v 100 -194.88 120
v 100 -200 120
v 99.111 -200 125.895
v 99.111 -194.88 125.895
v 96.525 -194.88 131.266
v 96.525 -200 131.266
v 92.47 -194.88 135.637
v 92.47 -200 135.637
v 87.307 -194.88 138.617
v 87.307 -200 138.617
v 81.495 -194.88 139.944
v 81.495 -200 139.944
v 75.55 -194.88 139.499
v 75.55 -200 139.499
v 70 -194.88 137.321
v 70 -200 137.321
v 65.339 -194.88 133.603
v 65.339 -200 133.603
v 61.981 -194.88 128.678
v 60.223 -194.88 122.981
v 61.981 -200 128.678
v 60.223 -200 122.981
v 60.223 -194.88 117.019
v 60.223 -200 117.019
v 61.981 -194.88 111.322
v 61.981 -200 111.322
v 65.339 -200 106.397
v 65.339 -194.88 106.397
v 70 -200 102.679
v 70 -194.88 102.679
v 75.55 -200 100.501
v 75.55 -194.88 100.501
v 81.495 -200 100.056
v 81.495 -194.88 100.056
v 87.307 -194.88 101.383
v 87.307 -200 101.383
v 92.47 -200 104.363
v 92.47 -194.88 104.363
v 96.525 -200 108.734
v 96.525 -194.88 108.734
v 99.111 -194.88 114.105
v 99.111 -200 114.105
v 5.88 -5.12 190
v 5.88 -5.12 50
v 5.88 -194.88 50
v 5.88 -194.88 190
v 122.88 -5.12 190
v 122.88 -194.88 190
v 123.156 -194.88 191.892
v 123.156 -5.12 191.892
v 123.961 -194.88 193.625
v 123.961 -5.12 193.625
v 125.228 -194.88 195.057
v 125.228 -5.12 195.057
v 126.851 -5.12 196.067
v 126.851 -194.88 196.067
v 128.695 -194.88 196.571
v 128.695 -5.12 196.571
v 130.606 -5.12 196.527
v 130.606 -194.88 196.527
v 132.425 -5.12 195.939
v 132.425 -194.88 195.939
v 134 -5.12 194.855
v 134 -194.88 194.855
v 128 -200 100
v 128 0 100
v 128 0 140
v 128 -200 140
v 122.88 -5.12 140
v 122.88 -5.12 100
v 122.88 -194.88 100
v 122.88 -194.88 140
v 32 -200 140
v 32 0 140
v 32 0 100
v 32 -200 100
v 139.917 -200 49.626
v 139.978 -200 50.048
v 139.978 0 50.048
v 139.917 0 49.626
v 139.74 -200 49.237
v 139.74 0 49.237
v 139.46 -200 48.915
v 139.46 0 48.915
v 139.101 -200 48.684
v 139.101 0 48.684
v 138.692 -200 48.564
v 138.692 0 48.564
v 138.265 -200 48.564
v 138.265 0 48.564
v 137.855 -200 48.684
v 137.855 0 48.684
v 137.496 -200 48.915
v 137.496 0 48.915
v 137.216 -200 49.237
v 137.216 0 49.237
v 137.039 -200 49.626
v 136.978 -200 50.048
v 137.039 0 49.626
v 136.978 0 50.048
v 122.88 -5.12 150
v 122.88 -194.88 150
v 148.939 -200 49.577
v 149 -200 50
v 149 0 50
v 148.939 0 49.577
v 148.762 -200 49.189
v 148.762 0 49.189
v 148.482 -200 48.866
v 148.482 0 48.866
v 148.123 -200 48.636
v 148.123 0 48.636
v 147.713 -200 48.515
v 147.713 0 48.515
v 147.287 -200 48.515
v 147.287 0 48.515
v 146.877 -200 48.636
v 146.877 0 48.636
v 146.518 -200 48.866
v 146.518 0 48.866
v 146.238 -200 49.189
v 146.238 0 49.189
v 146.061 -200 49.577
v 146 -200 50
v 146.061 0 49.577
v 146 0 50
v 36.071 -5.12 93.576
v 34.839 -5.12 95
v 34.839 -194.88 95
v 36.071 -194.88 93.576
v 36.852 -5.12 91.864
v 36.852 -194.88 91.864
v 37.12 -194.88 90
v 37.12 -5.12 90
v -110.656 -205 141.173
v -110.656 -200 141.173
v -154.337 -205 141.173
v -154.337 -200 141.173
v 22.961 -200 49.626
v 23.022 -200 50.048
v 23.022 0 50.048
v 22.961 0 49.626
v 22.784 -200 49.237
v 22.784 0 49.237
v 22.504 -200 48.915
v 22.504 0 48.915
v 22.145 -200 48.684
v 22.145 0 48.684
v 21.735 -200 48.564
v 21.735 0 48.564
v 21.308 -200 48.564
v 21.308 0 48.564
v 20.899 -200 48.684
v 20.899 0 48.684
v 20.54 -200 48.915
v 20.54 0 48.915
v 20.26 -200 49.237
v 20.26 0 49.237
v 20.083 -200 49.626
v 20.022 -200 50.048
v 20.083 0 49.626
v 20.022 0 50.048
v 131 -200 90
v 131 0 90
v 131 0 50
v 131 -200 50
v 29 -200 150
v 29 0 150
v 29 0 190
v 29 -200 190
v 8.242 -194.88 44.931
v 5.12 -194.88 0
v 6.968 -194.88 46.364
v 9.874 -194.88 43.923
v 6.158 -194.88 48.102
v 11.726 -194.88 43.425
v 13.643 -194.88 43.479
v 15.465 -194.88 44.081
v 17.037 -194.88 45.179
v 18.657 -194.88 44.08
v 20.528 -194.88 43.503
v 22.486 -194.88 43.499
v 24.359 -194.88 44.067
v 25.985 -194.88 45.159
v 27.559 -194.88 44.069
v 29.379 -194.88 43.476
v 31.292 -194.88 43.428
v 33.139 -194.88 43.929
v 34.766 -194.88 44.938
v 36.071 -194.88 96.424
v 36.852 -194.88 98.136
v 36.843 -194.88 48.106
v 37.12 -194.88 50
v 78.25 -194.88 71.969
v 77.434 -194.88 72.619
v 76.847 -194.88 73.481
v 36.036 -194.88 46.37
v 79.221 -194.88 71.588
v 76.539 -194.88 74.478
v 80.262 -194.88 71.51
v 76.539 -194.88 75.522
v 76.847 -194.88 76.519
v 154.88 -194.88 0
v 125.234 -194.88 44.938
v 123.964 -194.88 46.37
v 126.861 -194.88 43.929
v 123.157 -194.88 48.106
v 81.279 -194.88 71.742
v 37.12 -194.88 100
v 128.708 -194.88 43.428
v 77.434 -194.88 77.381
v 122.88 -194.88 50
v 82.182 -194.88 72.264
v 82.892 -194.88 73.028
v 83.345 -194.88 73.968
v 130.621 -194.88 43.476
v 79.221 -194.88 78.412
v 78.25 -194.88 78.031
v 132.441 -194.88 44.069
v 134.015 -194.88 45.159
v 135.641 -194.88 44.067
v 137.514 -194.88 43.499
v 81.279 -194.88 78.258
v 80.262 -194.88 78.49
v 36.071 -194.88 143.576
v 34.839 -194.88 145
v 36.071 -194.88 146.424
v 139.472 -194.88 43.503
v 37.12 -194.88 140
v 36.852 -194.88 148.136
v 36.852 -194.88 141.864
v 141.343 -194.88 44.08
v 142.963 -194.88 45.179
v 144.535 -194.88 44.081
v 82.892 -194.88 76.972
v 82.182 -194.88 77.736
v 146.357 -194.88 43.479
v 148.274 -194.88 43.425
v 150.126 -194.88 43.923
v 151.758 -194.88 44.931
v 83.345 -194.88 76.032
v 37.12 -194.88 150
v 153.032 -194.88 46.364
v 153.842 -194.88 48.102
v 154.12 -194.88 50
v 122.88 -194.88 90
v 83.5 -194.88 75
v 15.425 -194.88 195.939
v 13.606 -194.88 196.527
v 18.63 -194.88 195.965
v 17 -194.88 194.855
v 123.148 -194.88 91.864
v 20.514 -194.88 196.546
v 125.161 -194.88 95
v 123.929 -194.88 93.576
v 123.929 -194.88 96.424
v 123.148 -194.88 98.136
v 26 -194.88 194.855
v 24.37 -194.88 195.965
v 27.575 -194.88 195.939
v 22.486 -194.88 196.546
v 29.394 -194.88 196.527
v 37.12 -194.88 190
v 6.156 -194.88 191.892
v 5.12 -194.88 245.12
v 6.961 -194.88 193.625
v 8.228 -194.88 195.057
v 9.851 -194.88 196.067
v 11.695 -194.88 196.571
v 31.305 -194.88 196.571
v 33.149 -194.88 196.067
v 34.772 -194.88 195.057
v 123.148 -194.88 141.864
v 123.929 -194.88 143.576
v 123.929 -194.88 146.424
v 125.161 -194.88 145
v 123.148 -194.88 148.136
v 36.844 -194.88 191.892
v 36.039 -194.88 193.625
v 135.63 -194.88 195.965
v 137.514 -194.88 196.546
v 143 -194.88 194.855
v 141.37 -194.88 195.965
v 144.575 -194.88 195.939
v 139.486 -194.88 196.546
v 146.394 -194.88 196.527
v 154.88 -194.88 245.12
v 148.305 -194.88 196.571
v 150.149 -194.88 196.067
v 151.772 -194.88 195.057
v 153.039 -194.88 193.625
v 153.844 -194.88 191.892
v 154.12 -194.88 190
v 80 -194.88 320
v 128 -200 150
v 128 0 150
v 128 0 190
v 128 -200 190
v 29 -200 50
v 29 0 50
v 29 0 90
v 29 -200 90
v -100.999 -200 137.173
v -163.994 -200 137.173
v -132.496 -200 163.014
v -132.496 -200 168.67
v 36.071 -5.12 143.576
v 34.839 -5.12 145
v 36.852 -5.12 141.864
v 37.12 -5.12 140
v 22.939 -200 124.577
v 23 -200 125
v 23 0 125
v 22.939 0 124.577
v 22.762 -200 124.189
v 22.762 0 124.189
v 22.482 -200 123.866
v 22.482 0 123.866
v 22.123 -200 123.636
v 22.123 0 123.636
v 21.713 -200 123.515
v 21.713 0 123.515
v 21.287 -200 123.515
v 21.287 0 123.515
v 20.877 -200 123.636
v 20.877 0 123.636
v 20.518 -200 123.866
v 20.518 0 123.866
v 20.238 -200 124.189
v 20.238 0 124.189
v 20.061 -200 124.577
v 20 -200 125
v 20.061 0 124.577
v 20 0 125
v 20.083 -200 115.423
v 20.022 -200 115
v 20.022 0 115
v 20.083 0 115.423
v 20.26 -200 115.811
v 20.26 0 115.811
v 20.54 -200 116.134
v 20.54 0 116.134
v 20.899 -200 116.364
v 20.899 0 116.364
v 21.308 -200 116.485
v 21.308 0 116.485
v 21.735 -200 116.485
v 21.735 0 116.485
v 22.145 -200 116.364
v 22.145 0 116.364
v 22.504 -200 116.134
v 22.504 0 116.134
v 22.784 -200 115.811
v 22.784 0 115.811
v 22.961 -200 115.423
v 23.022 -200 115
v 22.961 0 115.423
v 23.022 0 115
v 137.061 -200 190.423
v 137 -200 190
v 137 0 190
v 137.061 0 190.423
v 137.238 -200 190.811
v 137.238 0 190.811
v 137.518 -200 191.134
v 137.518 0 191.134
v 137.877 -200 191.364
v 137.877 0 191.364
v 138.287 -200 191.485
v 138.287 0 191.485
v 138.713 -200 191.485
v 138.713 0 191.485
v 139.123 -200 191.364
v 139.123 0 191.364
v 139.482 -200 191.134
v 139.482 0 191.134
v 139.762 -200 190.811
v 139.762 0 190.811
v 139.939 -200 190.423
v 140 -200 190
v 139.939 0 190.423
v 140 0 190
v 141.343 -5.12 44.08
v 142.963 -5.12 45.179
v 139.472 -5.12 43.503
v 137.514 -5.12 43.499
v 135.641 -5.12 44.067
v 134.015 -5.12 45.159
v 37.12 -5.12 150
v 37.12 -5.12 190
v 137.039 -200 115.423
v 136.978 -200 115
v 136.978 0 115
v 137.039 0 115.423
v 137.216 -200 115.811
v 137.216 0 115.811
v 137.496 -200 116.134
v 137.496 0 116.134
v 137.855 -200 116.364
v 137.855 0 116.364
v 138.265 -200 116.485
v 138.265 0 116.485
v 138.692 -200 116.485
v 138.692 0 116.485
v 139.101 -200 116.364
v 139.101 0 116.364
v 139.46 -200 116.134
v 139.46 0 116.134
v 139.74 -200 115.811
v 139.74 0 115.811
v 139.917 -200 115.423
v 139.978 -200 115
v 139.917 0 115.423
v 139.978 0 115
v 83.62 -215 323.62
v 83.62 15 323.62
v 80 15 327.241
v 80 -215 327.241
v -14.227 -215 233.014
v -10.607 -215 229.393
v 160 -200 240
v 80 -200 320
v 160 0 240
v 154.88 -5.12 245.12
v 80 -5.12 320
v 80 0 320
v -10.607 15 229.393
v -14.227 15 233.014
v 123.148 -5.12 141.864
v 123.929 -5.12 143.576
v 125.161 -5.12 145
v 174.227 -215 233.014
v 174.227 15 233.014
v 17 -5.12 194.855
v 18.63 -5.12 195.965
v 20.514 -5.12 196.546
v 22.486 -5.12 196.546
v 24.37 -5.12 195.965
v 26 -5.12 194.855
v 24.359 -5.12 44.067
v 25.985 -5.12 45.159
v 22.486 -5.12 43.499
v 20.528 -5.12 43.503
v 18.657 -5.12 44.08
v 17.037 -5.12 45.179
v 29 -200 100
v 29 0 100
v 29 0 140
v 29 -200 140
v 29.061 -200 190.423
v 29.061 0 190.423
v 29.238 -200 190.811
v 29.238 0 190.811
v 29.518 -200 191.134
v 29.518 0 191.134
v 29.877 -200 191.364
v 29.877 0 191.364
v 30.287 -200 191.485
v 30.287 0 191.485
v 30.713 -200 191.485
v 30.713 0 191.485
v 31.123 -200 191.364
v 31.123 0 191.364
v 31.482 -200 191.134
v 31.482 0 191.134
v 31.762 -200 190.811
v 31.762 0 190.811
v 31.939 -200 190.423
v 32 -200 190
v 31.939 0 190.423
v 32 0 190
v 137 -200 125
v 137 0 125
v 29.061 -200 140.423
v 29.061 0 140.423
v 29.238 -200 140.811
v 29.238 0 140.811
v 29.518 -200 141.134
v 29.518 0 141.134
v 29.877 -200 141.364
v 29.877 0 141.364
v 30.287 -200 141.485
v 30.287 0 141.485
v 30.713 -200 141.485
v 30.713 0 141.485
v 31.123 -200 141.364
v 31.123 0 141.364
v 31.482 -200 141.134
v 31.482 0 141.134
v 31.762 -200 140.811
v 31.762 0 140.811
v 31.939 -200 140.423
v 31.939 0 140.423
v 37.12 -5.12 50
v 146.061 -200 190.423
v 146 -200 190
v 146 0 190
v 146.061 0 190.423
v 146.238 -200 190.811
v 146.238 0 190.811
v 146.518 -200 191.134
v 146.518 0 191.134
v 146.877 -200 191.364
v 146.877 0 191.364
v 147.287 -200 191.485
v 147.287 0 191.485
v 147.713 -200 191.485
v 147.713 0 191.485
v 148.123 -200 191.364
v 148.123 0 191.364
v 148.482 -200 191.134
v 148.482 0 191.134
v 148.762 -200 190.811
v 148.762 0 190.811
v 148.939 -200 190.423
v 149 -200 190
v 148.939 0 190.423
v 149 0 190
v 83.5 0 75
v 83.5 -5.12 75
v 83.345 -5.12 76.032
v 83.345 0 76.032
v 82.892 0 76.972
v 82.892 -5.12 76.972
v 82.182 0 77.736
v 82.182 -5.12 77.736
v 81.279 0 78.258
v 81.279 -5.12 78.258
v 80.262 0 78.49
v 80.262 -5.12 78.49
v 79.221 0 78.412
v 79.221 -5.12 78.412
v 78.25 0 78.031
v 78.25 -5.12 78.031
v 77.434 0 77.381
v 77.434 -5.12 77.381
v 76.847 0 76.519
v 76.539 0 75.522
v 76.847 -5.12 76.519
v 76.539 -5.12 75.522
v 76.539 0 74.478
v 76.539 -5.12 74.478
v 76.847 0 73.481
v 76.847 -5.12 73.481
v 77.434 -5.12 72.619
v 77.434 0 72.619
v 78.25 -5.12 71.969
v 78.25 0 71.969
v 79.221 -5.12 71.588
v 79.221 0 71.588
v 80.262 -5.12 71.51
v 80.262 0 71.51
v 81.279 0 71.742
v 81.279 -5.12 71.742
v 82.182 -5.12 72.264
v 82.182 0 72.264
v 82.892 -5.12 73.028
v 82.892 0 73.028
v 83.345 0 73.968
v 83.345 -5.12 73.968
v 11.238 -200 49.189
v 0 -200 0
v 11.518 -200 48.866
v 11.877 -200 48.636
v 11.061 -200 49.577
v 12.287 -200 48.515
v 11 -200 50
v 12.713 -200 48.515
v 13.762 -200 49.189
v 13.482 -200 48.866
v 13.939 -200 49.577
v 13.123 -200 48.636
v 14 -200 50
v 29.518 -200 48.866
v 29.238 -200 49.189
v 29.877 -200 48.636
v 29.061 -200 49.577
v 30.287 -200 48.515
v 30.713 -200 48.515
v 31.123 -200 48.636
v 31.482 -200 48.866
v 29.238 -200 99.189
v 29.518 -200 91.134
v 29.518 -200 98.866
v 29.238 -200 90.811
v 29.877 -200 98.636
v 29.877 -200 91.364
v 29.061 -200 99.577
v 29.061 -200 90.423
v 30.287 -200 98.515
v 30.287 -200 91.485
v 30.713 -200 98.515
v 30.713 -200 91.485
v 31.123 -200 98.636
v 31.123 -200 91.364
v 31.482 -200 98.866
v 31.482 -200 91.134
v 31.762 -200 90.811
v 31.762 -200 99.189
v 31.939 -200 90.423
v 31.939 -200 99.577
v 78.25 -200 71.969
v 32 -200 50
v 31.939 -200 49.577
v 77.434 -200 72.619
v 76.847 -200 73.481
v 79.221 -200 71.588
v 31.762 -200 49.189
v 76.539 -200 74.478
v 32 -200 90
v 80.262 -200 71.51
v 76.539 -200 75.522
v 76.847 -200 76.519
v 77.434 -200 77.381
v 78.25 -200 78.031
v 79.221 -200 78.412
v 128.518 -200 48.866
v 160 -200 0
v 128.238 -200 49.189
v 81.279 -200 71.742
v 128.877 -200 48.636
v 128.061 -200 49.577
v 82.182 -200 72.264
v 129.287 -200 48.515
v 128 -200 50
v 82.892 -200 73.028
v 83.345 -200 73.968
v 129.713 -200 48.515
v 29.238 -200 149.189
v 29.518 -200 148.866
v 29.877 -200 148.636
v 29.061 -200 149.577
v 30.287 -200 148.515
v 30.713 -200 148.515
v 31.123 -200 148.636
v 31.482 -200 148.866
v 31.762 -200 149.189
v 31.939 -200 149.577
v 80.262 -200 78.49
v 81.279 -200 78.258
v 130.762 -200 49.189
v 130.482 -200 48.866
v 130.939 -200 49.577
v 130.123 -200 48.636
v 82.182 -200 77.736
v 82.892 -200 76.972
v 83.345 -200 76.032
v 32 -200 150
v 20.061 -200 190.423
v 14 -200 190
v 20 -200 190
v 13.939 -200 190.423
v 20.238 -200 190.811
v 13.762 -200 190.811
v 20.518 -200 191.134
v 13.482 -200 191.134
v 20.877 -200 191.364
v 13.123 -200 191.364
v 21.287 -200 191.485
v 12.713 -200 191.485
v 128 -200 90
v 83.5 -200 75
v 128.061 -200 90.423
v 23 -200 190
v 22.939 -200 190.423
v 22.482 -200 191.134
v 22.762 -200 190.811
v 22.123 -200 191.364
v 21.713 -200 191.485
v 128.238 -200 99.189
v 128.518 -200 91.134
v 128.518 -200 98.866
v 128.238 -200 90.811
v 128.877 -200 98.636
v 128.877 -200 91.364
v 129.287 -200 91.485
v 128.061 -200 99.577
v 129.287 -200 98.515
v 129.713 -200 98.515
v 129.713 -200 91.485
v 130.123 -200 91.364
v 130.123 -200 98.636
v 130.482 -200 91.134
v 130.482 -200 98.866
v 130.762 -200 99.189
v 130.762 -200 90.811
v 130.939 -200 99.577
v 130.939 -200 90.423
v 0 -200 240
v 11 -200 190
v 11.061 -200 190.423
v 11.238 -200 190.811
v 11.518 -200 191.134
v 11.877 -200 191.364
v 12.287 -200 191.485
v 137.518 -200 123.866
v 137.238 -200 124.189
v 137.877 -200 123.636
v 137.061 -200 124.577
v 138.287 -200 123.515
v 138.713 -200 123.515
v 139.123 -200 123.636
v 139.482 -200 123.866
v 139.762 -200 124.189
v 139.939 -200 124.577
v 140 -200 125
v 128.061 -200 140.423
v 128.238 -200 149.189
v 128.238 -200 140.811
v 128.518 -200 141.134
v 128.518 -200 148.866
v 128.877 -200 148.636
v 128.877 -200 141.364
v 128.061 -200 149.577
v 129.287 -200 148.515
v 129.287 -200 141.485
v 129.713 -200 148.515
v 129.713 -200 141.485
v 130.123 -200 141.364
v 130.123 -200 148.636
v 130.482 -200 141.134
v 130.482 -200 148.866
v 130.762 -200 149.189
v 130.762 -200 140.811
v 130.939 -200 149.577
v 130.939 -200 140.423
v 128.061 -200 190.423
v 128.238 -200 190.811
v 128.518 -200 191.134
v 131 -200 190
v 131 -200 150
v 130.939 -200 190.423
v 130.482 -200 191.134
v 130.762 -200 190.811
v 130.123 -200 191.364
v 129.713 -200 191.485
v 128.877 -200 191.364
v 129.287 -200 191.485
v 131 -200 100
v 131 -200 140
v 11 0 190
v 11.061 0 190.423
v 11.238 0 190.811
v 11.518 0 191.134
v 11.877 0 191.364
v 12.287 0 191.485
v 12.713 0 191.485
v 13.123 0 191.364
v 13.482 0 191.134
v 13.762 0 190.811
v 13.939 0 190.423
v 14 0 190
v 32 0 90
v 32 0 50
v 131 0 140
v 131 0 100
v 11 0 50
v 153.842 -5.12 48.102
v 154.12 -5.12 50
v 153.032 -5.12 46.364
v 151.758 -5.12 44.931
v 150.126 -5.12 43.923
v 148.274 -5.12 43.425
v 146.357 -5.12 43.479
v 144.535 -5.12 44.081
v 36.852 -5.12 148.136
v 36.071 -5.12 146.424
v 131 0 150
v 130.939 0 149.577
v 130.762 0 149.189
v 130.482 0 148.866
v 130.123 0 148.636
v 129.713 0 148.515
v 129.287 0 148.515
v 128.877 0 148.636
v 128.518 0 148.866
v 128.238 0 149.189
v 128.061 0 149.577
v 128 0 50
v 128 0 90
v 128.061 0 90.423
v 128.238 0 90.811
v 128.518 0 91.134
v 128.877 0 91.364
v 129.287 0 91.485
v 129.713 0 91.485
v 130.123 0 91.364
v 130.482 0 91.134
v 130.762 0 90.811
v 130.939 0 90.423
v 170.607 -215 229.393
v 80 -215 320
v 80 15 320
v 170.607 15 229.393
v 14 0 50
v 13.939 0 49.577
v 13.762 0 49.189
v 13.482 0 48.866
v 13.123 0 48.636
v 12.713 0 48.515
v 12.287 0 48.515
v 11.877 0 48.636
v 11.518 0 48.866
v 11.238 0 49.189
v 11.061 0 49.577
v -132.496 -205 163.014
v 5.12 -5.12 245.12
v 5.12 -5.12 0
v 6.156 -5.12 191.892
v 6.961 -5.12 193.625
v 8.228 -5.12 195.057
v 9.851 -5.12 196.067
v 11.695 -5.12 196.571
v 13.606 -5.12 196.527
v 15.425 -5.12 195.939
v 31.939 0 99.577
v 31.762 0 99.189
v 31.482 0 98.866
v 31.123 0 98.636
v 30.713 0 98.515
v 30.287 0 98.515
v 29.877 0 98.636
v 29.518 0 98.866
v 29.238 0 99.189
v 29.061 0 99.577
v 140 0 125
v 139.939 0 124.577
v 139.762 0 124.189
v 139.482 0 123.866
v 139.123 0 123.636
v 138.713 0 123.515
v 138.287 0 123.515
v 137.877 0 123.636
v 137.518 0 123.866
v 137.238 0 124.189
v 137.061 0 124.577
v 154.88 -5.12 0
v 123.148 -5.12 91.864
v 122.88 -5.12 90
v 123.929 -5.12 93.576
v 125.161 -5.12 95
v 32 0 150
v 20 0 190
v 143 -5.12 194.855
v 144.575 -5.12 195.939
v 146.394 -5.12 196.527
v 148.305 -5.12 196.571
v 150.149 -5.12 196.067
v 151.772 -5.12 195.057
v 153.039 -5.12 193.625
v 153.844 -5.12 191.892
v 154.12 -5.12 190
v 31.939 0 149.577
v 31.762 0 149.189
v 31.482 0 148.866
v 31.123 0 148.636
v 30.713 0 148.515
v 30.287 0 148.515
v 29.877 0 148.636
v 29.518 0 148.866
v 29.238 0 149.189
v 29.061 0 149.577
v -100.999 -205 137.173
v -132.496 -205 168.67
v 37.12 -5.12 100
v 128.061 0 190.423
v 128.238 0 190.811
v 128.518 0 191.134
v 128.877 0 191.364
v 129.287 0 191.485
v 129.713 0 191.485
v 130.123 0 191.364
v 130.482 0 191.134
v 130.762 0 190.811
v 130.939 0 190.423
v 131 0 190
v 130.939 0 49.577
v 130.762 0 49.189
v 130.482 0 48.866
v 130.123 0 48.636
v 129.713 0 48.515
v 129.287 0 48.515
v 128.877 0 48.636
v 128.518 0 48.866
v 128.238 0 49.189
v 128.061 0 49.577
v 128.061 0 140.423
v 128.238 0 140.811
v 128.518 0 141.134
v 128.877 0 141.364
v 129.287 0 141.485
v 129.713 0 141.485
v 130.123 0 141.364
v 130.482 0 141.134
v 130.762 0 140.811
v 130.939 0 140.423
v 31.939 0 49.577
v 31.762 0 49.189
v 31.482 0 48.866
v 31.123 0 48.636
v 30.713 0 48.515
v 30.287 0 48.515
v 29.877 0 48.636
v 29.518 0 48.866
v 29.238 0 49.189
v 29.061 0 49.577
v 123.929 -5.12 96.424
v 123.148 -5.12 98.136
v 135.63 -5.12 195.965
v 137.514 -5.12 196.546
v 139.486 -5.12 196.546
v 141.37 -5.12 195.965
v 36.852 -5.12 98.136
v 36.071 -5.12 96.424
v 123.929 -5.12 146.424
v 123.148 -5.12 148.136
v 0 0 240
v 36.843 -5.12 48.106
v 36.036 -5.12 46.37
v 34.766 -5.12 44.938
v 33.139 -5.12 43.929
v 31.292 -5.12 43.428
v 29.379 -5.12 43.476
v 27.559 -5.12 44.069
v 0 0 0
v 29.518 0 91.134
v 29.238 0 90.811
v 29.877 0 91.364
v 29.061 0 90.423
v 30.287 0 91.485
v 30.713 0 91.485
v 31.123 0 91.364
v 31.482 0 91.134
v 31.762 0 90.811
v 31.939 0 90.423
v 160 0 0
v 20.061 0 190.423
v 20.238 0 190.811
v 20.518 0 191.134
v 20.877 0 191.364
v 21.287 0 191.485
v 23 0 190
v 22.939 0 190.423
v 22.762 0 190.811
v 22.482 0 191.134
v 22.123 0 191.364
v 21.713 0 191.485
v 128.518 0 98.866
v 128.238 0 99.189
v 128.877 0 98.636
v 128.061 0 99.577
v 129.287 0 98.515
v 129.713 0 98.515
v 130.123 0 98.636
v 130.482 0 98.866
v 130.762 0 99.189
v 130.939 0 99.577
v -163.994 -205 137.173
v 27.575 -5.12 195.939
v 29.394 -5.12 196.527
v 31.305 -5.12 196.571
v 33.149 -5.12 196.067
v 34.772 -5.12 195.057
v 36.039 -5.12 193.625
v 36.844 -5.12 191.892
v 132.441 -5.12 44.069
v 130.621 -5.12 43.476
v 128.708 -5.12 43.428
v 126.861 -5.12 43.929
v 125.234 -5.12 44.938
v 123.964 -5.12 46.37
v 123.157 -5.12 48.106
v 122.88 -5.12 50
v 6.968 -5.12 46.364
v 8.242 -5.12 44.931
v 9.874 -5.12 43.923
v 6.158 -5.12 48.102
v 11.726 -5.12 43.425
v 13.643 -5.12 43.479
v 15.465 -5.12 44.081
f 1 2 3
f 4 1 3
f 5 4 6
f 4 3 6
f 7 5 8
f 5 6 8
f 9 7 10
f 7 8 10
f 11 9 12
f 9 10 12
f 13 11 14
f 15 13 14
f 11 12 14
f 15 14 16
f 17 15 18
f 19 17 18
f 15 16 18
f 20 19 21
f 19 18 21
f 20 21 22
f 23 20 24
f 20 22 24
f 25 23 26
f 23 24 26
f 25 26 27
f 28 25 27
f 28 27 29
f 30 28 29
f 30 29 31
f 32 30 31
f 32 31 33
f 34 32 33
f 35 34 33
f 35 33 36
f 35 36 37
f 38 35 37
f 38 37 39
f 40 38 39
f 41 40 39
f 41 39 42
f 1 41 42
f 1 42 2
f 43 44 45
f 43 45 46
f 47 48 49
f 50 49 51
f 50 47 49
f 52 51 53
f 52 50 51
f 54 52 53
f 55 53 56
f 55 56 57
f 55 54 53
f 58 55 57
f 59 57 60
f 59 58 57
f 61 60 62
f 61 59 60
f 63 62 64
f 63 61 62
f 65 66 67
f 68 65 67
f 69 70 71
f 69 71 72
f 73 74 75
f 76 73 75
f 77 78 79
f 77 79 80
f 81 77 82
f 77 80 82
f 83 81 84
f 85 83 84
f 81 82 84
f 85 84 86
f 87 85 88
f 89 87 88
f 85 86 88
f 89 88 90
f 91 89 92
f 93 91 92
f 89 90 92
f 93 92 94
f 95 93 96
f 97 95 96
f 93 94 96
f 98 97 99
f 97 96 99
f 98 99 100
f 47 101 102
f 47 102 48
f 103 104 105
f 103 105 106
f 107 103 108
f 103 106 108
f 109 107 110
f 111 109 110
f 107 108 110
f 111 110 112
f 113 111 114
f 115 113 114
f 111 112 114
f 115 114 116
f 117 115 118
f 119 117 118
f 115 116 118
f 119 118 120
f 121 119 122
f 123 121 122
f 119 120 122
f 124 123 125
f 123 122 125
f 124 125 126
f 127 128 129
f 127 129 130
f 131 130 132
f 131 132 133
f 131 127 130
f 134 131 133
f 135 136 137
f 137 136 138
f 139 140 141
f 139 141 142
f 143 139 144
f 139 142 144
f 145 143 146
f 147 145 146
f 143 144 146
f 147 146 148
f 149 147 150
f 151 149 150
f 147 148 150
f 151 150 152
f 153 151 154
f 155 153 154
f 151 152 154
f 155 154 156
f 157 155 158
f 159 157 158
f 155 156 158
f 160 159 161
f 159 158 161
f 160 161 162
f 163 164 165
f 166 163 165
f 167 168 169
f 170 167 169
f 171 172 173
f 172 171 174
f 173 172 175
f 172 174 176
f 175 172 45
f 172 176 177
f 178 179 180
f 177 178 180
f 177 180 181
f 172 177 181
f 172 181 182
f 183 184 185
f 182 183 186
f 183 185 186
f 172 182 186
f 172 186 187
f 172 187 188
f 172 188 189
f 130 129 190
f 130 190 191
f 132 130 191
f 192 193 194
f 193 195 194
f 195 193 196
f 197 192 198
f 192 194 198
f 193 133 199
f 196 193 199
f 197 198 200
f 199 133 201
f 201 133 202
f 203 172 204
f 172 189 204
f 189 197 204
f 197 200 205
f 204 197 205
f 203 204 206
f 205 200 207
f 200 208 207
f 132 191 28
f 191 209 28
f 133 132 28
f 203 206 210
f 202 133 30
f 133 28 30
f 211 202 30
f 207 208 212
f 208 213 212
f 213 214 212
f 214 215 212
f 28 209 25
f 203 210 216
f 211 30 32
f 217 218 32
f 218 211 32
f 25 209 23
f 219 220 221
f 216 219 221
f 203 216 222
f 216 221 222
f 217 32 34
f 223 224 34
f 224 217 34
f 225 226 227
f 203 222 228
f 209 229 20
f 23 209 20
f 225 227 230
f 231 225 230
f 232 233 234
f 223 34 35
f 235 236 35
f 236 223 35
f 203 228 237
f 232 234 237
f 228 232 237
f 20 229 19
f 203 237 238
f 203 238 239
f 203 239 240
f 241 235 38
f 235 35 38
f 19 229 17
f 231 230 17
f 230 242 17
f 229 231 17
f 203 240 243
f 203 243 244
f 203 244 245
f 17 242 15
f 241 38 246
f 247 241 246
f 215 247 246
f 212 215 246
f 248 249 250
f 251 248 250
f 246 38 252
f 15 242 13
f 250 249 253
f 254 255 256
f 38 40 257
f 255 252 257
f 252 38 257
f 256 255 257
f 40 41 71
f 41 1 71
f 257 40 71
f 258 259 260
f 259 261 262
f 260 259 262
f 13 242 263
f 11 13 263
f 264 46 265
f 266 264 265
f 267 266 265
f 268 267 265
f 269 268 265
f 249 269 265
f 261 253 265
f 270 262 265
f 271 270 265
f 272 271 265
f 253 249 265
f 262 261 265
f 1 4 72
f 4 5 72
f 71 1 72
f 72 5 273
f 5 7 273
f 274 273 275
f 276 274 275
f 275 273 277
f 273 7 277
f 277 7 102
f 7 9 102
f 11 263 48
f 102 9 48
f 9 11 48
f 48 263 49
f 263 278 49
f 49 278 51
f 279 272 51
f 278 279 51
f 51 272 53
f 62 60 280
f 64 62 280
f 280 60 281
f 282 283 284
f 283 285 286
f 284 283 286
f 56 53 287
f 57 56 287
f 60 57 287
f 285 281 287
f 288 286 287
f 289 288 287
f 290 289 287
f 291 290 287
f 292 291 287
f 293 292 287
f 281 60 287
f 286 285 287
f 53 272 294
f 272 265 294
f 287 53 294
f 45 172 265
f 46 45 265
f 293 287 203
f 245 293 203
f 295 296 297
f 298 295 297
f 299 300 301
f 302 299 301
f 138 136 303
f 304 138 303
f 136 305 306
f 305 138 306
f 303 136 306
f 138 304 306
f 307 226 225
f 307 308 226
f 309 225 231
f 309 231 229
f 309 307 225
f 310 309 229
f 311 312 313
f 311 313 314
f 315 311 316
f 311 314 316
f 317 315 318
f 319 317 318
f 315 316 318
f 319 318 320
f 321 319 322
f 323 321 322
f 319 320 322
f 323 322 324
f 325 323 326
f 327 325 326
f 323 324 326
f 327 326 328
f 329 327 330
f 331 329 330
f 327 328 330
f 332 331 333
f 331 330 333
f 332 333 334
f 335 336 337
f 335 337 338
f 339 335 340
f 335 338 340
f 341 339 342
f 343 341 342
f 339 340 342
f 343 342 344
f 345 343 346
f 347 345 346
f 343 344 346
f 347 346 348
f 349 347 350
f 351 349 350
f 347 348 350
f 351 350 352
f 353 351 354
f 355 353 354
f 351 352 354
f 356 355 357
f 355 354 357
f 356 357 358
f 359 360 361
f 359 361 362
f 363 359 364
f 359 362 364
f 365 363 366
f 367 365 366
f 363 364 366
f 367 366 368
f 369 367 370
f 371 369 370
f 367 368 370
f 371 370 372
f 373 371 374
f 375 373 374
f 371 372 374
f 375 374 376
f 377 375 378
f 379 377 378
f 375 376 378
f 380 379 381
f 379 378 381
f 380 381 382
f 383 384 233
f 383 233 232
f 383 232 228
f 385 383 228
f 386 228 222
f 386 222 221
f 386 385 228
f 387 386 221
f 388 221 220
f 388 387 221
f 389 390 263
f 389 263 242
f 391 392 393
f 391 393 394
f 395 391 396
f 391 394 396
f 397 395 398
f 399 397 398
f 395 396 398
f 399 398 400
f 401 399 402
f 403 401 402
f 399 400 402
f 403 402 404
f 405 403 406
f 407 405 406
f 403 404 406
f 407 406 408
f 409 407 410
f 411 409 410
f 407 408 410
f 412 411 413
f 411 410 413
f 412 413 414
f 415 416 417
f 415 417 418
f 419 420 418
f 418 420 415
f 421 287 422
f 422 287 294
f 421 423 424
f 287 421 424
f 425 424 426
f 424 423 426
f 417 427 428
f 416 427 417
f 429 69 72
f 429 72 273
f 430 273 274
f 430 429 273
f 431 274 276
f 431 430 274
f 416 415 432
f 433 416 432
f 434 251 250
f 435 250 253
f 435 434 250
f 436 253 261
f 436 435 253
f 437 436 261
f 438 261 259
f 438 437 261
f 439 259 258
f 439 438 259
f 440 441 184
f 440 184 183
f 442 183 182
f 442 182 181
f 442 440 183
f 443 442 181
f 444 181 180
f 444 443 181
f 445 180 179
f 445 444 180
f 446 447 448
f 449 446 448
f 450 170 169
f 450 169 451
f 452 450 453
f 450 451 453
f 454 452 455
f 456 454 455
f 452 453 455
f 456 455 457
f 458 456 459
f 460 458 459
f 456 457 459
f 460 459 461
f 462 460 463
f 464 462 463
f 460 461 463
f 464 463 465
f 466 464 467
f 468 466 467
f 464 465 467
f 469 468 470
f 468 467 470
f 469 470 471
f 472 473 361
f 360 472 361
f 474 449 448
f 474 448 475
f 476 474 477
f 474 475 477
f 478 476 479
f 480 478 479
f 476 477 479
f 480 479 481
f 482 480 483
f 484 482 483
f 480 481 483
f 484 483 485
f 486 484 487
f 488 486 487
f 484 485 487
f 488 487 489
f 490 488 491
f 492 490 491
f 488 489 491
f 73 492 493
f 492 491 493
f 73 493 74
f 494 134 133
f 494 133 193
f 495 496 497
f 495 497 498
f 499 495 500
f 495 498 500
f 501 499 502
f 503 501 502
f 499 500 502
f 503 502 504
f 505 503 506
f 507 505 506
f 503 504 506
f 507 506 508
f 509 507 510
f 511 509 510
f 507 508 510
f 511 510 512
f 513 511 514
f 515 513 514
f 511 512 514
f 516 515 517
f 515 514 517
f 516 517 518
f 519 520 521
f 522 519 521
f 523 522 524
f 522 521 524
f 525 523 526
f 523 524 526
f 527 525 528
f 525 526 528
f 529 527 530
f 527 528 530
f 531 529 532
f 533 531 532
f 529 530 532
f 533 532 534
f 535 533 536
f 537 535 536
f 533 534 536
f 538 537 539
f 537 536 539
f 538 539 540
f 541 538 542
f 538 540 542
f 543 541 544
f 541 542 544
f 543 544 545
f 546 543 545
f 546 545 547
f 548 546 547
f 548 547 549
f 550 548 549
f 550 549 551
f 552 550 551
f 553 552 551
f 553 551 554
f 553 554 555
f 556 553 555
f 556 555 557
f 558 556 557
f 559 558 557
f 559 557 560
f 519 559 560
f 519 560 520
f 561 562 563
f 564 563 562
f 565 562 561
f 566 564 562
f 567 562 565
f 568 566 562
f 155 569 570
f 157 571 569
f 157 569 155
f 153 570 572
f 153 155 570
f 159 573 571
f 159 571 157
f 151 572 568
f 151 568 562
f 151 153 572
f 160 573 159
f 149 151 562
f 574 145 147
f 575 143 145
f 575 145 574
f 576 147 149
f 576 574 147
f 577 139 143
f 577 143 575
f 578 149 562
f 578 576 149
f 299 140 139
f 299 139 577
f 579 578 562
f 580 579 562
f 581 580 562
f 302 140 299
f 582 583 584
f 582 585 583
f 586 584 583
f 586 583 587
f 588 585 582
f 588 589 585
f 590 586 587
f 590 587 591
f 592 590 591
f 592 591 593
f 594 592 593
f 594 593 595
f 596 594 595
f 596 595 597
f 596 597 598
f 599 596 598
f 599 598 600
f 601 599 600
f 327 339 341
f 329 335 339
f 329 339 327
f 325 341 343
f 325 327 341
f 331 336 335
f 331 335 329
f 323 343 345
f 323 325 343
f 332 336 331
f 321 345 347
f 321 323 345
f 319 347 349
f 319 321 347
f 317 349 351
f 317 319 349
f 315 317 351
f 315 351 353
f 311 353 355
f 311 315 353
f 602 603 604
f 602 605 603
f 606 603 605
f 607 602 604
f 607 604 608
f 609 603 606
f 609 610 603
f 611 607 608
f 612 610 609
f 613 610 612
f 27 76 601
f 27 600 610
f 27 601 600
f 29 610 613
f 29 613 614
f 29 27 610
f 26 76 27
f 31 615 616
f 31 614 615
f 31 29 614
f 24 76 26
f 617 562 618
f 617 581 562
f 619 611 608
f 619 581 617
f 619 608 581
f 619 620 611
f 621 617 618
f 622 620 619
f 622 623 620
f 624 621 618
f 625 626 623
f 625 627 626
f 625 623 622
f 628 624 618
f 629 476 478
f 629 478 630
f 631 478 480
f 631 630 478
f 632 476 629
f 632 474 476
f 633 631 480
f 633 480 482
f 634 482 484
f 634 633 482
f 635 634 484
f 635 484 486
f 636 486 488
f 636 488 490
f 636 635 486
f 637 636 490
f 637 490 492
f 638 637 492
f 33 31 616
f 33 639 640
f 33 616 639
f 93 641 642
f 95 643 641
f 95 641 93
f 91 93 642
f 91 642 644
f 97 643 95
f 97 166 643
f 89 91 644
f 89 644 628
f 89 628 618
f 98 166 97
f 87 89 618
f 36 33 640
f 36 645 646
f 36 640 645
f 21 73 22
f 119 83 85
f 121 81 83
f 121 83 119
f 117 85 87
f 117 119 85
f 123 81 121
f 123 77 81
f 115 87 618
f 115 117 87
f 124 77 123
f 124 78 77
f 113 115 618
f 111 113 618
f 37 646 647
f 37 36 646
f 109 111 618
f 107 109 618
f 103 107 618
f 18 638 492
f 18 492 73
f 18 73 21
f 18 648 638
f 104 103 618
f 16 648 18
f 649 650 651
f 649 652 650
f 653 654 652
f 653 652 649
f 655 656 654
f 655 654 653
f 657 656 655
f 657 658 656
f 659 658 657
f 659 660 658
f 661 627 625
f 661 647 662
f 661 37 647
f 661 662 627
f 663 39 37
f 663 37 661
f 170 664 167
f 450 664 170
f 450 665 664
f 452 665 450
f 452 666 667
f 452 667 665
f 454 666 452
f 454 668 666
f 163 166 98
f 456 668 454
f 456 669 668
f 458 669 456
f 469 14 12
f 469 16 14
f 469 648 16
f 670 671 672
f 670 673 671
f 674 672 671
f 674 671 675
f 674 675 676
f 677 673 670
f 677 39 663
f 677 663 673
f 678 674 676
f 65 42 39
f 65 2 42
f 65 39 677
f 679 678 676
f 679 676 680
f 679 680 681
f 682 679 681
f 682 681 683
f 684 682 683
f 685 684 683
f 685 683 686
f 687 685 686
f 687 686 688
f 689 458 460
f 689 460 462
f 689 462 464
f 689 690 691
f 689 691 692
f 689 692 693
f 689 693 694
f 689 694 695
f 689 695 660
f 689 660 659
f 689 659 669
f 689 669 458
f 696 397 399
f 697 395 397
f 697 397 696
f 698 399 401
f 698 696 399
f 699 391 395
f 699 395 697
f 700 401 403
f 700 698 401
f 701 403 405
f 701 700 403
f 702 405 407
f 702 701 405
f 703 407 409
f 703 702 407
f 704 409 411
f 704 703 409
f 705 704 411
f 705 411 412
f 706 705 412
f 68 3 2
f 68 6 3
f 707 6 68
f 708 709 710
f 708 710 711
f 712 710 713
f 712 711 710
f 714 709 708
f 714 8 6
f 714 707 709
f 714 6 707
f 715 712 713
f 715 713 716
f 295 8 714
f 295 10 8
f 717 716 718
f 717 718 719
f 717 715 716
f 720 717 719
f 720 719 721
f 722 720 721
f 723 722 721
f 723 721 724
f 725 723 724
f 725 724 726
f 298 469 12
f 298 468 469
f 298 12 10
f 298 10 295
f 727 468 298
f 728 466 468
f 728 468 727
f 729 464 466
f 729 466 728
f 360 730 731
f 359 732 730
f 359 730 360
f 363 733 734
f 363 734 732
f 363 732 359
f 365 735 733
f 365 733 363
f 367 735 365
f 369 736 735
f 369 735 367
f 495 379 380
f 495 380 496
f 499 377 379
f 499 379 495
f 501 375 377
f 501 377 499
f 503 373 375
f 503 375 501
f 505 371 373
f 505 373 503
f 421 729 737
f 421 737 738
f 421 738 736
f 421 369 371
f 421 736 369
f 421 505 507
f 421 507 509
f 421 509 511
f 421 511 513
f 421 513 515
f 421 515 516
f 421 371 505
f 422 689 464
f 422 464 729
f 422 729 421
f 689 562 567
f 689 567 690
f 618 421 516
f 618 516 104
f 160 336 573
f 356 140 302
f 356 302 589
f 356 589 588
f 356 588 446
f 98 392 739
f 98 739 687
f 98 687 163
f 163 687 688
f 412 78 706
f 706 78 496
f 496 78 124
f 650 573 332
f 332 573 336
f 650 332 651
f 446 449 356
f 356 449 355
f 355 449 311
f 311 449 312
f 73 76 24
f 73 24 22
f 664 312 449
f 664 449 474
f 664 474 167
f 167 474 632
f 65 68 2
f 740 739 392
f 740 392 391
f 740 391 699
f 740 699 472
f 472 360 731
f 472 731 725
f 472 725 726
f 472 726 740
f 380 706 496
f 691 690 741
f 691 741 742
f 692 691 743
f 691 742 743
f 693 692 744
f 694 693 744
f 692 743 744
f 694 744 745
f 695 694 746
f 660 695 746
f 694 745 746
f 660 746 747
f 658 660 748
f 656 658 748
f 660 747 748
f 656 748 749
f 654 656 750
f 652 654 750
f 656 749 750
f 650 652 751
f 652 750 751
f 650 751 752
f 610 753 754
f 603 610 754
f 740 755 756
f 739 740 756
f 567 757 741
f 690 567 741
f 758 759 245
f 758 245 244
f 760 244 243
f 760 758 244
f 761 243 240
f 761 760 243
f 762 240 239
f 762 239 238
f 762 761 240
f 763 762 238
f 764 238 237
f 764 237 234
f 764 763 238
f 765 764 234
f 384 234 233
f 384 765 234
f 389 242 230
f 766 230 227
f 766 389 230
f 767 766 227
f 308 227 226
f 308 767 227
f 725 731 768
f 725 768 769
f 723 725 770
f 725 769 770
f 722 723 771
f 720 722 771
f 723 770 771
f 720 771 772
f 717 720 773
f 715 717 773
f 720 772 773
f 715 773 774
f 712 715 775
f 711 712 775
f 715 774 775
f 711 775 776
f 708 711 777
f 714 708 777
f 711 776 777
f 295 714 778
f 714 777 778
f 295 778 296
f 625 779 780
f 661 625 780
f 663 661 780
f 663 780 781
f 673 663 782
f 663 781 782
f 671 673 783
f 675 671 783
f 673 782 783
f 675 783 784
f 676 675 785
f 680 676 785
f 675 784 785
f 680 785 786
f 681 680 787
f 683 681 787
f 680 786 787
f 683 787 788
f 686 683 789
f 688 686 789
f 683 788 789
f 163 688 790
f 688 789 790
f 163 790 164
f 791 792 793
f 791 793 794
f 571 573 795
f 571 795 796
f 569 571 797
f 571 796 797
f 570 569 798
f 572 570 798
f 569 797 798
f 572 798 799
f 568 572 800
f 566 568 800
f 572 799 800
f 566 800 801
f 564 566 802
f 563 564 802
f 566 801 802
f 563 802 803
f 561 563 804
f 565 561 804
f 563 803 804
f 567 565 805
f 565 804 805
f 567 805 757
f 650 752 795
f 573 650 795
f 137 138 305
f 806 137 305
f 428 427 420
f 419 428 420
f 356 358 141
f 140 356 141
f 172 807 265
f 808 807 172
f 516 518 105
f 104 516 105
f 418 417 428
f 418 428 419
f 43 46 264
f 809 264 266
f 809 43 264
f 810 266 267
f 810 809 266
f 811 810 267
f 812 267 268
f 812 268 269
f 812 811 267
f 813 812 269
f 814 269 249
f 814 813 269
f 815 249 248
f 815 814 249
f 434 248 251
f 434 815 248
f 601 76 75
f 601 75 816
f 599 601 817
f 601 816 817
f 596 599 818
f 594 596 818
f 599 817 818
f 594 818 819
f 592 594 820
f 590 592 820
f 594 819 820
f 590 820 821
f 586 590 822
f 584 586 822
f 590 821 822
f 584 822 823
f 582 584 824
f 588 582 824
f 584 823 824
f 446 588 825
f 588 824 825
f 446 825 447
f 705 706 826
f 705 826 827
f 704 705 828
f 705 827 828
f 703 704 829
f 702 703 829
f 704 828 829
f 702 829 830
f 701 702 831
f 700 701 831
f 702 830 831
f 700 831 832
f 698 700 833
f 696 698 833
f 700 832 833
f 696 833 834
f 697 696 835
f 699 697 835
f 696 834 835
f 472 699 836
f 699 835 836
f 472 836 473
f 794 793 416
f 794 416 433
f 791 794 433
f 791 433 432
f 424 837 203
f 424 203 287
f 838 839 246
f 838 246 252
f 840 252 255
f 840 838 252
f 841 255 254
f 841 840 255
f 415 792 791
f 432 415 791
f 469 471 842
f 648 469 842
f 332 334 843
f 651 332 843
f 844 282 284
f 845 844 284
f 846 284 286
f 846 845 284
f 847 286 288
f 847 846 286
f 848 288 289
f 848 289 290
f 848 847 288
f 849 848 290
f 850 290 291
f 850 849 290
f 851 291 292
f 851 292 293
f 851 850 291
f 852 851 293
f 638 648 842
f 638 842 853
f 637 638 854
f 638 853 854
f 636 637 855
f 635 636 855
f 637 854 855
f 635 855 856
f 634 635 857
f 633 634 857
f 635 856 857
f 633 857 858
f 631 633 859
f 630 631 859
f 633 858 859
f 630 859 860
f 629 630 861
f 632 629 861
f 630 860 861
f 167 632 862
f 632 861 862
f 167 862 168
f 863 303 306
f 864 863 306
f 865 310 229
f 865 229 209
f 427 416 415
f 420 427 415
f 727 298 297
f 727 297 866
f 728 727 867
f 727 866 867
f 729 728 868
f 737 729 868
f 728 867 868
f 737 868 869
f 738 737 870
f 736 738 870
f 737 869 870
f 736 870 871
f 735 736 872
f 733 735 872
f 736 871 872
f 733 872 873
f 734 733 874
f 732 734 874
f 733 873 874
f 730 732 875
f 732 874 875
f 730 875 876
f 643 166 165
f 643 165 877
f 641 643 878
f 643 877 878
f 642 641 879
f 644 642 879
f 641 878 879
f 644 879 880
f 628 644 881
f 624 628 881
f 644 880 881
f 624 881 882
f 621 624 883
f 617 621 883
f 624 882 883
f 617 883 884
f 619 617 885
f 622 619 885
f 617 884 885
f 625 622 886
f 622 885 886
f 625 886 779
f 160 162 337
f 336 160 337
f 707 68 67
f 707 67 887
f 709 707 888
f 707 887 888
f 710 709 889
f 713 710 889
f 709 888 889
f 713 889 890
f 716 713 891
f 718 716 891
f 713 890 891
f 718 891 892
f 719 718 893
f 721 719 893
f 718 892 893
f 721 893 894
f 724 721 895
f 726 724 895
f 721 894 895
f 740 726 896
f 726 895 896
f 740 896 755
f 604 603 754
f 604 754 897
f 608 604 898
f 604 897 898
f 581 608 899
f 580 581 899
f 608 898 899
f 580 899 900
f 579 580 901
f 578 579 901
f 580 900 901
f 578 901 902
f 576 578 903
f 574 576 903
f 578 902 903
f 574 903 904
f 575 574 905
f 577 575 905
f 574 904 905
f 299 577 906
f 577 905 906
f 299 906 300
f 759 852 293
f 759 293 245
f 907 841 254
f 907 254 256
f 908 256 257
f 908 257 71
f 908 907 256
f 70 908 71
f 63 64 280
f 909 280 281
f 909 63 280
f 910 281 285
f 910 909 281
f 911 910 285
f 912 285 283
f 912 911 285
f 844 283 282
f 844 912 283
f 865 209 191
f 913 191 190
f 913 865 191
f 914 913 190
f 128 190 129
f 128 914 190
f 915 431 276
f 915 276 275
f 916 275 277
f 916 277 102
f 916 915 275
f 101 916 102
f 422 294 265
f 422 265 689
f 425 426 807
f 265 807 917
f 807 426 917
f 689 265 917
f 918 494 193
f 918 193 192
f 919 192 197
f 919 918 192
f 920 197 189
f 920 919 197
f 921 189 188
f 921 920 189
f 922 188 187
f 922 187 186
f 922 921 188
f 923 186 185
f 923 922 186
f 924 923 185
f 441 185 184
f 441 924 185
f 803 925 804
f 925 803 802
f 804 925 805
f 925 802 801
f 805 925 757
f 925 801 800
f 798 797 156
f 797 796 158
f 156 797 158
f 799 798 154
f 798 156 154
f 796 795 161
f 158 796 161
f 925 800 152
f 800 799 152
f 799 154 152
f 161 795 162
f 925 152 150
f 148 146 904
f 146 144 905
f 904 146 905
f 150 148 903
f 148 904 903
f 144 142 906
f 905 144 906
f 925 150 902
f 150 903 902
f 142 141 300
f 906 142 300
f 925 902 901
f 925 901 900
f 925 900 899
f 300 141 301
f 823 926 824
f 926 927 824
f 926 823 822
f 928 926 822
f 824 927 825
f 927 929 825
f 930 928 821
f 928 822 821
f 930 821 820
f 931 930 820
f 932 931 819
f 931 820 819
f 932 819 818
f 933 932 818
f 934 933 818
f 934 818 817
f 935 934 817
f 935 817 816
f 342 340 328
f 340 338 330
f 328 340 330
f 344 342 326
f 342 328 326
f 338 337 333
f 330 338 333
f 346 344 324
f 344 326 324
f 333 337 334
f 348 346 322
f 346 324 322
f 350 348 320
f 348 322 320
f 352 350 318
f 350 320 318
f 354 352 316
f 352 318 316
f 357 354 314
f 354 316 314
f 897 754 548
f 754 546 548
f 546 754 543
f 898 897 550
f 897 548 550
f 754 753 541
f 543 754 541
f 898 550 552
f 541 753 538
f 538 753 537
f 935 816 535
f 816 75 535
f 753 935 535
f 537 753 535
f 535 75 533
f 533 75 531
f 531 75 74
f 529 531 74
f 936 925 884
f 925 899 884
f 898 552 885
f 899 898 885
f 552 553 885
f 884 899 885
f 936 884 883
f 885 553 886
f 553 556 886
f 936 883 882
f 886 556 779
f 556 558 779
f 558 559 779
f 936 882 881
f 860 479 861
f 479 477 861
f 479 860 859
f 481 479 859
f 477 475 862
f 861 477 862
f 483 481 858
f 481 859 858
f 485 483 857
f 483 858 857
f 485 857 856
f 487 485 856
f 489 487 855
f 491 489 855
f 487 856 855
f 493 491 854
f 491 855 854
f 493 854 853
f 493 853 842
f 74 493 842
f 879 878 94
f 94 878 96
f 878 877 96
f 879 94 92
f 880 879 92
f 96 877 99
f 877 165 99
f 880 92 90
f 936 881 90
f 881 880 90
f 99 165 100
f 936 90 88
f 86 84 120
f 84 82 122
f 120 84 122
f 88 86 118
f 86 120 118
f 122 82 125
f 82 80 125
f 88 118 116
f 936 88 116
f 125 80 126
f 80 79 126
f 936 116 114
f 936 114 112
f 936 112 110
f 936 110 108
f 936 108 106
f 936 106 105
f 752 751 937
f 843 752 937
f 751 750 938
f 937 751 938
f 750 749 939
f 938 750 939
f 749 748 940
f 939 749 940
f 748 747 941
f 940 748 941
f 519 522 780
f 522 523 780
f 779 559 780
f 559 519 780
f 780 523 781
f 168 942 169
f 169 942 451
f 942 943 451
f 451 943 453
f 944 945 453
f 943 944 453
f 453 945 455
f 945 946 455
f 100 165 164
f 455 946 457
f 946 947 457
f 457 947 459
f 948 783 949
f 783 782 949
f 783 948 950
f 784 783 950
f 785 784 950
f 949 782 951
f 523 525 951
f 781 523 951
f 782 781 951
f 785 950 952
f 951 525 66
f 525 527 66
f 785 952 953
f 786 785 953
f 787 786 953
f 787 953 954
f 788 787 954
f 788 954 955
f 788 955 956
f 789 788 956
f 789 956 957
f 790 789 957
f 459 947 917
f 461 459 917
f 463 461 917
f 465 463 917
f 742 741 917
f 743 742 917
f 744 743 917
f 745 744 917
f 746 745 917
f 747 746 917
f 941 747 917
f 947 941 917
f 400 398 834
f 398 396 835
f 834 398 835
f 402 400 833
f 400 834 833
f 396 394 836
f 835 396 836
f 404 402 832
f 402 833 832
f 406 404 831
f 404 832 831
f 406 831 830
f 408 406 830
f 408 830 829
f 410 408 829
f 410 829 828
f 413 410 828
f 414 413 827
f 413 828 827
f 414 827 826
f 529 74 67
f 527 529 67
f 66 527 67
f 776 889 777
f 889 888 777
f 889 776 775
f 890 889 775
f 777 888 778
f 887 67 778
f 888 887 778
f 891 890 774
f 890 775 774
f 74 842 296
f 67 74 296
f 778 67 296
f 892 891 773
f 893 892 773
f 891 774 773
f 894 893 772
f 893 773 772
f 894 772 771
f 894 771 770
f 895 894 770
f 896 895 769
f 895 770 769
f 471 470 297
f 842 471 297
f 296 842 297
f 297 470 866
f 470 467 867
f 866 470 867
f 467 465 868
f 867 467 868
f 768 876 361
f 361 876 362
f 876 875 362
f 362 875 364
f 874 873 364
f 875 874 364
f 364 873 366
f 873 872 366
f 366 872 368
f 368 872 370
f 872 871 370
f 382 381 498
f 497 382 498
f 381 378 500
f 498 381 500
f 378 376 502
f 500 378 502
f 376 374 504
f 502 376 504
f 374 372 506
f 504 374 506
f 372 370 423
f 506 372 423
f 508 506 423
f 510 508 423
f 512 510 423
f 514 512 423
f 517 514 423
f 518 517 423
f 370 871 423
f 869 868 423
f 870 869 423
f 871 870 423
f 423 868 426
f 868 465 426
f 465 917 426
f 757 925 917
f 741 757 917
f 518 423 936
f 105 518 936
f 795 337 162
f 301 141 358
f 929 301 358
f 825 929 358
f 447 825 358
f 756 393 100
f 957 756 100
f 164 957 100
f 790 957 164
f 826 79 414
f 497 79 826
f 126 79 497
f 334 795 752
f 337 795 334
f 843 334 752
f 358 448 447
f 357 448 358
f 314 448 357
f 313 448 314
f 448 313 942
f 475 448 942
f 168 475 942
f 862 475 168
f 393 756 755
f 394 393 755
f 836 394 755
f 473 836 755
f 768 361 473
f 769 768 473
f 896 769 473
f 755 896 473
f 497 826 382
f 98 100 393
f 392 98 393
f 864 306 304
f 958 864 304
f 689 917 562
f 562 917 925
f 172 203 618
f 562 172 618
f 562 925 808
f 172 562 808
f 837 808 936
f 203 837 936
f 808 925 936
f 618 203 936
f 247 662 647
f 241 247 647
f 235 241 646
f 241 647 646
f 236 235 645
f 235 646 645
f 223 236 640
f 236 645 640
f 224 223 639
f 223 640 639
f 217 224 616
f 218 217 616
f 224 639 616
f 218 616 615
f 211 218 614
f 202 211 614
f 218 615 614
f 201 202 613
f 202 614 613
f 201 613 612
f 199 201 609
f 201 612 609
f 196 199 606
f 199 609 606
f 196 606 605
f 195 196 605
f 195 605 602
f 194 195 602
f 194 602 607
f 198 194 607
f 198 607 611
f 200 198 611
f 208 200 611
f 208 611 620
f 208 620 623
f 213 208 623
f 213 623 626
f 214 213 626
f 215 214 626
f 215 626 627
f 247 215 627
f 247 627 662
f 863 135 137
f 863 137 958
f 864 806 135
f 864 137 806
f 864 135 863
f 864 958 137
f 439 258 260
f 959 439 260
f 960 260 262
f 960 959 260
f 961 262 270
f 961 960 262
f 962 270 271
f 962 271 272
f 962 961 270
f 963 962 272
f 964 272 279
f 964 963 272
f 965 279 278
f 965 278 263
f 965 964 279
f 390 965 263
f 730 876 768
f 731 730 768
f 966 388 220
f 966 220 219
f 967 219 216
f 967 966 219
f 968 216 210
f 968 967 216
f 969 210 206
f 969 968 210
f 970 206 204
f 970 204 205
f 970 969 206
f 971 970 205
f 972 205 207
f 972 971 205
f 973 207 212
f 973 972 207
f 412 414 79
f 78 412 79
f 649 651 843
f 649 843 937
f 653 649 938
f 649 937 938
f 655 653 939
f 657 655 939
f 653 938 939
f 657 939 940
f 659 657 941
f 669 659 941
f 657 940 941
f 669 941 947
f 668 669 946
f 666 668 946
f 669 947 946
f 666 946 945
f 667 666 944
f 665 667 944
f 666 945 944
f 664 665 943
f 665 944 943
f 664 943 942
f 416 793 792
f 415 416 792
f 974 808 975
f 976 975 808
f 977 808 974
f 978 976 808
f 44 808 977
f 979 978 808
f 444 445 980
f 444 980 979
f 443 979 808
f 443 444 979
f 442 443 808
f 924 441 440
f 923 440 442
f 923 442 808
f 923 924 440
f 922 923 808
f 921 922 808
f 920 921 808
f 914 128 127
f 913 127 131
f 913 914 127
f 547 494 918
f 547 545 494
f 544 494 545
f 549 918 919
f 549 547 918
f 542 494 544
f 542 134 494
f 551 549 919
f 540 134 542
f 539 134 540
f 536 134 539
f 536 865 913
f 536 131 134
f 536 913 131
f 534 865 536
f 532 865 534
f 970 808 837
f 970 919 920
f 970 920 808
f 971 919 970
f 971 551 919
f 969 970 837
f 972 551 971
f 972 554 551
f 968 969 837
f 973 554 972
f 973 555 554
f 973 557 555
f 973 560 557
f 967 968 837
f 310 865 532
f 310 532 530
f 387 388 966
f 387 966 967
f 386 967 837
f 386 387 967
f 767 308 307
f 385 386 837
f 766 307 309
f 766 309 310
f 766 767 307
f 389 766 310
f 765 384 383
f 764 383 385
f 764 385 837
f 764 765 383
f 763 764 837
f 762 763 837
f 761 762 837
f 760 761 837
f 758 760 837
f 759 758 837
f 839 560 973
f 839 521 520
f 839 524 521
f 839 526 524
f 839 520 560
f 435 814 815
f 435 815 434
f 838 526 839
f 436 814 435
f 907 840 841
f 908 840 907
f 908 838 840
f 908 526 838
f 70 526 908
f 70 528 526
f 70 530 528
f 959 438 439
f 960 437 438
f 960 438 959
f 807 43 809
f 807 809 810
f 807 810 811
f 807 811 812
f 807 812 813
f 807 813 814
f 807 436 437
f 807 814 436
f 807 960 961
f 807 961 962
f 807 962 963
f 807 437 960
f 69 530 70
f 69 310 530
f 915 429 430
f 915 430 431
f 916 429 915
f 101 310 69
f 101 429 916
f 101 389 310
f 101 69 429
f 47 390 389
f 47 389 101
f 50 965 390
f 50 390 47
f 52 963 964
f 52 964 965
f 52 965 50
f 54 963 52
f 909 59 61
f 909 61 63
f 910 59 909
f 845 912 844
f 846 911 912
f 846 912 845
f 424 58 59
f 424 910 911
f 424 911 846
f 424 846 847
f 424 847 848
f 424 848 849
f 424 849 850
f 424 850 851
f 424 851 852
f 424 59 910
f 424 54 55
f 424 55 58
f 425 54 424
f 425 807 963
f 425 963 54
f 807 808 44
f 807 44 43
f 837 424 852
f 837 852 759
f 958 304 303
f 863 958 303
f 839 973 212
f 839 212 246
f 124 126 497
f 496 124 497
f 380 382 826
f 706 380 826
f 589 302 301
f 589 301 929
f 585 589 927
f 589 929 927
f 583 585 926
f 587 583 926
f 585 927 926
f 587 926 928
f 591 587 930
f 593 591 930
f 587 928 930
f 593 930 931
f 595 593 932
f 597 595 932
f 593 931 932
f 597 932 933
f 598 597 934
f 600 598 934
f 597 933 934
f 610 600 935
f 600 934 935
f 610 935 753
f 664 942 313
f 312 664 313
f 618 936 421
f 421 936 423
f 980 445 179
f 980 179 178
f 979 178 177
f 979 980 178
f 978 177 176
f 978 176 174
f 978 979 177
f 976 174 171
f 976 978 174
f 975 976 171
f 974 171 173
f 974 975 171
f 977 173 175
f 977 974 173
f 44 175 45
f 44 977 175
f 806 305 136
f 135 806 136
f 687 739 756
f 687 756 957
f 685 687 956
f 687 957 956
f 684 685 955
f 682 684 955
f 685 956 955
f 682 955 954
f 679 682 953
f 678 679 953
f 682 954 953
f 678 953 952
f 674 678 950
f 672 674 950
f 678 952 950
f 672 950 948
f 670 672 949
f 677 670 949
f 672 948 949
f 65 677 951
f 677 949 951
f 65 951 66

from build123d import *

# Parameters (mm, degrees)
F1_DEPTH  = 200
F2_T      = -5.12
F3_R      = 20
F4_DEPTH  = 25
F3_R_2    = 3.5
F5_DEPTH  = 220
F7_W      = 128.137085
F7_H      = 230
F8_DEPTH  = 5.12
F10_W     = 230
F10_H     = 133.257085
F11_DEPTH = 5.12
F14_DEPTH = 5


with BuildPart() as f1:
    # F0 (on Front) → F1 (new body)
    with BuildSketch(Plane.XZ):
        Polygon((0, 240), (0, 0), (160, 0), (160, 240), (80, 320), align=None)
        with BuildLine():
            Line((29, 50), (29, 90))
            ThreePointArc((29, 90), (30.5, 91.5), (32, 90))
            Line((32, 90), (32, 50))
            ThreePointArc((32, 50), (30.5, 48.5), (29, 50))
        make_face(mode=Mode.SUBTRACT)
        with BuildLine():
            Line((20.021926, 50.048288), (20.021926, 115))
            ThreePointArc((20.021926, 115), (21.521926, 116.5), (23.021926, 115))
            Line((23.021926, 115), (23.021926, 50.048288))
            ThreePointArc((23.021926, 50.048288), (21.521926, 48.548288), (20.021926, 50.048288))
        make_face(mode=Mode.SUBTRACT)
        with BuildLine():
            Line((14, 190), (14, 50))
            ThreePointArc((14, 50), (12.5, 48.5), (11, 50))
            Line((11, 50), (11, 190))
            ThreePointArc((11, 190), (12.5, 191.5), (14, 190))
        make_face(mode=Mode.SUBTRACT)
        with BuildLine():
            Line((29, 100), (29, 140))
            ThreePointArc((29, 140), (30.5, 141.5), (32, 140))
            Line((32, 140), (32, 100))
            ThreePointArc((32, 100), (30.5, 98.5), (29, 100))
        make_face(mode=Mode.SUBTRACT)
        with BuildLine():
            Line((20, 125), (20, 190))
            ThreePointArc((20, 190), (21.5, 191.5), (23, 190))
            Line((23, 190), (23, 125))
            ThreePointArc((23, 125), (21.5, 123.5), (20, 125))
        make_face(mode=Mode.SUBTRACT)
        with BuildLine():
            ThreePointArc((128, 90), (129.5, 91.5), (131, 90))
            Line((131, 90), (131, 50))
            ThreePointArc((131, 50), (129.5, 48.5), (128, 50))
            Line((128, 50), (128, 90))
        make_face(mode=Mode.SUBTRACT)
        with BuildLine():
            Line((136.978074, 50.048288), (136.978074, 115))
            ThreePointArc((136.978074, 115), (138.478074, 116.5), (139.978074, 115))
            Line((139.978074, 115), (139.978074, 50.048288))
            ThreePointArc((139.978074, 50.048288), (138.478074, 48.548288), (136.978074, 50.048288))
        make_face(mode=Mode.SUBTRACT)
        with BuildLine():
            Line((128, 100), (128, 140))
            ThreePointArc((128, 140), (129.5, 141.5), (131, 140))
            Line((131, 140), (131, 100))
            ThreePointArc((131, 100), (129.5, 98.5), (128, 100))
        make_face(mode=Mode.SUBTRACT)
        with BuildLine():
            Line((137, 125), (137, 190))
            ThreePointArc((137, 190), (138.5, 191.5), (140, 190))
            Line((140, 190), (140, 125))
            ThreePointArc((140, 125), (138.5, 123.5), (137, 125))
        make_face(mode=Mode.SUBTRACT)
        with BuildLine():
            ThreePointArc((146, 190), (147.5, 191.5), (149, 190))
            Line((149, 190), (149, 50))
            ThreePointArc((149, 50), (147.5, 48.5), (146, 50))
            Line((146, 50), (146, 190))
        make_face(mode=Mode.SUBTRACT)
        with BuildLine():
            Line((29, 150), (29, 190))
            ThreePointArc((29, 190), (30.5, 191.5), (32, 190))
            Line((32, 190), (32, 150))
            ThreePointArc((32, 150), (30.5, 148.5), (29, 150))
        make_face(mode=Mode.SUBTRACT)
        with BuildLine():
            Line((128, 150), (128, 190))
            ThreePointArc((128, 190), (129.5, 191.5), (131, 190))
            Line((131, 190), (131, 150))
            ThreePointArc((131, 150), (129.5, 148.5), (128, 150))
        make_face(mode=Mode.SUBTRACT)
    extrude(amount=F1_DEPTH)

    # F2
    f2_openings = [f1.faces().sort_by_distance(p)[0] for p in [
        (80, -100, 0),
        (120, -100, 280),
        (40, -100, 280),
    ]]
    offset(amount=F2_T, openings=f2_openings)

    # F3 (on face) → F4 (cut)
    with BuildSketch(Plane.XZ.offset(200)):
        with Locations((80, 120)):
            Circle(F3_R)
    extrude(amount=-F4_DEPTH, mode=Mode.SUBTRACT)

    # F3 (on face) → F5 (cut)
    with BuildSketch(Plane.XZ.offset(200)):
        with Locations((80, 75)):
            Circle(F3_R_2)
    extrude(amount=-F5_DEPTH, mode=Mode.SUBTRACT)


with BuildPart() as f8:
    # F7 (on face) → F8 (new body)
    with BuildSketch(Plane(origin=(200, 0, 200), x_dir=(0.707107, 0, -0.707107), z_dir=(-0.707107, 0, -0.707107))):
        with Locations((-105.637085, 100)):
            Rectangle(F7_W, F7_H)
    extrude(amount=-F8_DEPTH)


with BuildPart() as f11:
    # F10 (on face) → F11 (new body)
    with BuildSketch(Plane(origin=(-120, 0, 120), x_dir=(0, -1, 0), z_dir=(-0.707107, 0, 0.707107))):
        with Locations((100, 221.33417)):
            Rectangle(F10_W, F10_H)
    extrude(amount=F11_DEPTH)


with BuildPart() as f14:
    # F13 (on face) → F14 (new body)
    with BuildSketch(Plane.XZ.offset(200)):
        Polygon((-132.496486, 168.67048), (-163.99388, 137.173086), (-100.999093, 137.173086), align=None)
        Polygon((-110.655947, 141.173086), (-154.337026, 141.173086), (-132.496486, 163.013626), align=None, mode=Mode.SUBTRACT)
    extrude(amount=F14_DEPTH)


solid = Compound([f1.part, f8.part, f11.part, f14.part])
